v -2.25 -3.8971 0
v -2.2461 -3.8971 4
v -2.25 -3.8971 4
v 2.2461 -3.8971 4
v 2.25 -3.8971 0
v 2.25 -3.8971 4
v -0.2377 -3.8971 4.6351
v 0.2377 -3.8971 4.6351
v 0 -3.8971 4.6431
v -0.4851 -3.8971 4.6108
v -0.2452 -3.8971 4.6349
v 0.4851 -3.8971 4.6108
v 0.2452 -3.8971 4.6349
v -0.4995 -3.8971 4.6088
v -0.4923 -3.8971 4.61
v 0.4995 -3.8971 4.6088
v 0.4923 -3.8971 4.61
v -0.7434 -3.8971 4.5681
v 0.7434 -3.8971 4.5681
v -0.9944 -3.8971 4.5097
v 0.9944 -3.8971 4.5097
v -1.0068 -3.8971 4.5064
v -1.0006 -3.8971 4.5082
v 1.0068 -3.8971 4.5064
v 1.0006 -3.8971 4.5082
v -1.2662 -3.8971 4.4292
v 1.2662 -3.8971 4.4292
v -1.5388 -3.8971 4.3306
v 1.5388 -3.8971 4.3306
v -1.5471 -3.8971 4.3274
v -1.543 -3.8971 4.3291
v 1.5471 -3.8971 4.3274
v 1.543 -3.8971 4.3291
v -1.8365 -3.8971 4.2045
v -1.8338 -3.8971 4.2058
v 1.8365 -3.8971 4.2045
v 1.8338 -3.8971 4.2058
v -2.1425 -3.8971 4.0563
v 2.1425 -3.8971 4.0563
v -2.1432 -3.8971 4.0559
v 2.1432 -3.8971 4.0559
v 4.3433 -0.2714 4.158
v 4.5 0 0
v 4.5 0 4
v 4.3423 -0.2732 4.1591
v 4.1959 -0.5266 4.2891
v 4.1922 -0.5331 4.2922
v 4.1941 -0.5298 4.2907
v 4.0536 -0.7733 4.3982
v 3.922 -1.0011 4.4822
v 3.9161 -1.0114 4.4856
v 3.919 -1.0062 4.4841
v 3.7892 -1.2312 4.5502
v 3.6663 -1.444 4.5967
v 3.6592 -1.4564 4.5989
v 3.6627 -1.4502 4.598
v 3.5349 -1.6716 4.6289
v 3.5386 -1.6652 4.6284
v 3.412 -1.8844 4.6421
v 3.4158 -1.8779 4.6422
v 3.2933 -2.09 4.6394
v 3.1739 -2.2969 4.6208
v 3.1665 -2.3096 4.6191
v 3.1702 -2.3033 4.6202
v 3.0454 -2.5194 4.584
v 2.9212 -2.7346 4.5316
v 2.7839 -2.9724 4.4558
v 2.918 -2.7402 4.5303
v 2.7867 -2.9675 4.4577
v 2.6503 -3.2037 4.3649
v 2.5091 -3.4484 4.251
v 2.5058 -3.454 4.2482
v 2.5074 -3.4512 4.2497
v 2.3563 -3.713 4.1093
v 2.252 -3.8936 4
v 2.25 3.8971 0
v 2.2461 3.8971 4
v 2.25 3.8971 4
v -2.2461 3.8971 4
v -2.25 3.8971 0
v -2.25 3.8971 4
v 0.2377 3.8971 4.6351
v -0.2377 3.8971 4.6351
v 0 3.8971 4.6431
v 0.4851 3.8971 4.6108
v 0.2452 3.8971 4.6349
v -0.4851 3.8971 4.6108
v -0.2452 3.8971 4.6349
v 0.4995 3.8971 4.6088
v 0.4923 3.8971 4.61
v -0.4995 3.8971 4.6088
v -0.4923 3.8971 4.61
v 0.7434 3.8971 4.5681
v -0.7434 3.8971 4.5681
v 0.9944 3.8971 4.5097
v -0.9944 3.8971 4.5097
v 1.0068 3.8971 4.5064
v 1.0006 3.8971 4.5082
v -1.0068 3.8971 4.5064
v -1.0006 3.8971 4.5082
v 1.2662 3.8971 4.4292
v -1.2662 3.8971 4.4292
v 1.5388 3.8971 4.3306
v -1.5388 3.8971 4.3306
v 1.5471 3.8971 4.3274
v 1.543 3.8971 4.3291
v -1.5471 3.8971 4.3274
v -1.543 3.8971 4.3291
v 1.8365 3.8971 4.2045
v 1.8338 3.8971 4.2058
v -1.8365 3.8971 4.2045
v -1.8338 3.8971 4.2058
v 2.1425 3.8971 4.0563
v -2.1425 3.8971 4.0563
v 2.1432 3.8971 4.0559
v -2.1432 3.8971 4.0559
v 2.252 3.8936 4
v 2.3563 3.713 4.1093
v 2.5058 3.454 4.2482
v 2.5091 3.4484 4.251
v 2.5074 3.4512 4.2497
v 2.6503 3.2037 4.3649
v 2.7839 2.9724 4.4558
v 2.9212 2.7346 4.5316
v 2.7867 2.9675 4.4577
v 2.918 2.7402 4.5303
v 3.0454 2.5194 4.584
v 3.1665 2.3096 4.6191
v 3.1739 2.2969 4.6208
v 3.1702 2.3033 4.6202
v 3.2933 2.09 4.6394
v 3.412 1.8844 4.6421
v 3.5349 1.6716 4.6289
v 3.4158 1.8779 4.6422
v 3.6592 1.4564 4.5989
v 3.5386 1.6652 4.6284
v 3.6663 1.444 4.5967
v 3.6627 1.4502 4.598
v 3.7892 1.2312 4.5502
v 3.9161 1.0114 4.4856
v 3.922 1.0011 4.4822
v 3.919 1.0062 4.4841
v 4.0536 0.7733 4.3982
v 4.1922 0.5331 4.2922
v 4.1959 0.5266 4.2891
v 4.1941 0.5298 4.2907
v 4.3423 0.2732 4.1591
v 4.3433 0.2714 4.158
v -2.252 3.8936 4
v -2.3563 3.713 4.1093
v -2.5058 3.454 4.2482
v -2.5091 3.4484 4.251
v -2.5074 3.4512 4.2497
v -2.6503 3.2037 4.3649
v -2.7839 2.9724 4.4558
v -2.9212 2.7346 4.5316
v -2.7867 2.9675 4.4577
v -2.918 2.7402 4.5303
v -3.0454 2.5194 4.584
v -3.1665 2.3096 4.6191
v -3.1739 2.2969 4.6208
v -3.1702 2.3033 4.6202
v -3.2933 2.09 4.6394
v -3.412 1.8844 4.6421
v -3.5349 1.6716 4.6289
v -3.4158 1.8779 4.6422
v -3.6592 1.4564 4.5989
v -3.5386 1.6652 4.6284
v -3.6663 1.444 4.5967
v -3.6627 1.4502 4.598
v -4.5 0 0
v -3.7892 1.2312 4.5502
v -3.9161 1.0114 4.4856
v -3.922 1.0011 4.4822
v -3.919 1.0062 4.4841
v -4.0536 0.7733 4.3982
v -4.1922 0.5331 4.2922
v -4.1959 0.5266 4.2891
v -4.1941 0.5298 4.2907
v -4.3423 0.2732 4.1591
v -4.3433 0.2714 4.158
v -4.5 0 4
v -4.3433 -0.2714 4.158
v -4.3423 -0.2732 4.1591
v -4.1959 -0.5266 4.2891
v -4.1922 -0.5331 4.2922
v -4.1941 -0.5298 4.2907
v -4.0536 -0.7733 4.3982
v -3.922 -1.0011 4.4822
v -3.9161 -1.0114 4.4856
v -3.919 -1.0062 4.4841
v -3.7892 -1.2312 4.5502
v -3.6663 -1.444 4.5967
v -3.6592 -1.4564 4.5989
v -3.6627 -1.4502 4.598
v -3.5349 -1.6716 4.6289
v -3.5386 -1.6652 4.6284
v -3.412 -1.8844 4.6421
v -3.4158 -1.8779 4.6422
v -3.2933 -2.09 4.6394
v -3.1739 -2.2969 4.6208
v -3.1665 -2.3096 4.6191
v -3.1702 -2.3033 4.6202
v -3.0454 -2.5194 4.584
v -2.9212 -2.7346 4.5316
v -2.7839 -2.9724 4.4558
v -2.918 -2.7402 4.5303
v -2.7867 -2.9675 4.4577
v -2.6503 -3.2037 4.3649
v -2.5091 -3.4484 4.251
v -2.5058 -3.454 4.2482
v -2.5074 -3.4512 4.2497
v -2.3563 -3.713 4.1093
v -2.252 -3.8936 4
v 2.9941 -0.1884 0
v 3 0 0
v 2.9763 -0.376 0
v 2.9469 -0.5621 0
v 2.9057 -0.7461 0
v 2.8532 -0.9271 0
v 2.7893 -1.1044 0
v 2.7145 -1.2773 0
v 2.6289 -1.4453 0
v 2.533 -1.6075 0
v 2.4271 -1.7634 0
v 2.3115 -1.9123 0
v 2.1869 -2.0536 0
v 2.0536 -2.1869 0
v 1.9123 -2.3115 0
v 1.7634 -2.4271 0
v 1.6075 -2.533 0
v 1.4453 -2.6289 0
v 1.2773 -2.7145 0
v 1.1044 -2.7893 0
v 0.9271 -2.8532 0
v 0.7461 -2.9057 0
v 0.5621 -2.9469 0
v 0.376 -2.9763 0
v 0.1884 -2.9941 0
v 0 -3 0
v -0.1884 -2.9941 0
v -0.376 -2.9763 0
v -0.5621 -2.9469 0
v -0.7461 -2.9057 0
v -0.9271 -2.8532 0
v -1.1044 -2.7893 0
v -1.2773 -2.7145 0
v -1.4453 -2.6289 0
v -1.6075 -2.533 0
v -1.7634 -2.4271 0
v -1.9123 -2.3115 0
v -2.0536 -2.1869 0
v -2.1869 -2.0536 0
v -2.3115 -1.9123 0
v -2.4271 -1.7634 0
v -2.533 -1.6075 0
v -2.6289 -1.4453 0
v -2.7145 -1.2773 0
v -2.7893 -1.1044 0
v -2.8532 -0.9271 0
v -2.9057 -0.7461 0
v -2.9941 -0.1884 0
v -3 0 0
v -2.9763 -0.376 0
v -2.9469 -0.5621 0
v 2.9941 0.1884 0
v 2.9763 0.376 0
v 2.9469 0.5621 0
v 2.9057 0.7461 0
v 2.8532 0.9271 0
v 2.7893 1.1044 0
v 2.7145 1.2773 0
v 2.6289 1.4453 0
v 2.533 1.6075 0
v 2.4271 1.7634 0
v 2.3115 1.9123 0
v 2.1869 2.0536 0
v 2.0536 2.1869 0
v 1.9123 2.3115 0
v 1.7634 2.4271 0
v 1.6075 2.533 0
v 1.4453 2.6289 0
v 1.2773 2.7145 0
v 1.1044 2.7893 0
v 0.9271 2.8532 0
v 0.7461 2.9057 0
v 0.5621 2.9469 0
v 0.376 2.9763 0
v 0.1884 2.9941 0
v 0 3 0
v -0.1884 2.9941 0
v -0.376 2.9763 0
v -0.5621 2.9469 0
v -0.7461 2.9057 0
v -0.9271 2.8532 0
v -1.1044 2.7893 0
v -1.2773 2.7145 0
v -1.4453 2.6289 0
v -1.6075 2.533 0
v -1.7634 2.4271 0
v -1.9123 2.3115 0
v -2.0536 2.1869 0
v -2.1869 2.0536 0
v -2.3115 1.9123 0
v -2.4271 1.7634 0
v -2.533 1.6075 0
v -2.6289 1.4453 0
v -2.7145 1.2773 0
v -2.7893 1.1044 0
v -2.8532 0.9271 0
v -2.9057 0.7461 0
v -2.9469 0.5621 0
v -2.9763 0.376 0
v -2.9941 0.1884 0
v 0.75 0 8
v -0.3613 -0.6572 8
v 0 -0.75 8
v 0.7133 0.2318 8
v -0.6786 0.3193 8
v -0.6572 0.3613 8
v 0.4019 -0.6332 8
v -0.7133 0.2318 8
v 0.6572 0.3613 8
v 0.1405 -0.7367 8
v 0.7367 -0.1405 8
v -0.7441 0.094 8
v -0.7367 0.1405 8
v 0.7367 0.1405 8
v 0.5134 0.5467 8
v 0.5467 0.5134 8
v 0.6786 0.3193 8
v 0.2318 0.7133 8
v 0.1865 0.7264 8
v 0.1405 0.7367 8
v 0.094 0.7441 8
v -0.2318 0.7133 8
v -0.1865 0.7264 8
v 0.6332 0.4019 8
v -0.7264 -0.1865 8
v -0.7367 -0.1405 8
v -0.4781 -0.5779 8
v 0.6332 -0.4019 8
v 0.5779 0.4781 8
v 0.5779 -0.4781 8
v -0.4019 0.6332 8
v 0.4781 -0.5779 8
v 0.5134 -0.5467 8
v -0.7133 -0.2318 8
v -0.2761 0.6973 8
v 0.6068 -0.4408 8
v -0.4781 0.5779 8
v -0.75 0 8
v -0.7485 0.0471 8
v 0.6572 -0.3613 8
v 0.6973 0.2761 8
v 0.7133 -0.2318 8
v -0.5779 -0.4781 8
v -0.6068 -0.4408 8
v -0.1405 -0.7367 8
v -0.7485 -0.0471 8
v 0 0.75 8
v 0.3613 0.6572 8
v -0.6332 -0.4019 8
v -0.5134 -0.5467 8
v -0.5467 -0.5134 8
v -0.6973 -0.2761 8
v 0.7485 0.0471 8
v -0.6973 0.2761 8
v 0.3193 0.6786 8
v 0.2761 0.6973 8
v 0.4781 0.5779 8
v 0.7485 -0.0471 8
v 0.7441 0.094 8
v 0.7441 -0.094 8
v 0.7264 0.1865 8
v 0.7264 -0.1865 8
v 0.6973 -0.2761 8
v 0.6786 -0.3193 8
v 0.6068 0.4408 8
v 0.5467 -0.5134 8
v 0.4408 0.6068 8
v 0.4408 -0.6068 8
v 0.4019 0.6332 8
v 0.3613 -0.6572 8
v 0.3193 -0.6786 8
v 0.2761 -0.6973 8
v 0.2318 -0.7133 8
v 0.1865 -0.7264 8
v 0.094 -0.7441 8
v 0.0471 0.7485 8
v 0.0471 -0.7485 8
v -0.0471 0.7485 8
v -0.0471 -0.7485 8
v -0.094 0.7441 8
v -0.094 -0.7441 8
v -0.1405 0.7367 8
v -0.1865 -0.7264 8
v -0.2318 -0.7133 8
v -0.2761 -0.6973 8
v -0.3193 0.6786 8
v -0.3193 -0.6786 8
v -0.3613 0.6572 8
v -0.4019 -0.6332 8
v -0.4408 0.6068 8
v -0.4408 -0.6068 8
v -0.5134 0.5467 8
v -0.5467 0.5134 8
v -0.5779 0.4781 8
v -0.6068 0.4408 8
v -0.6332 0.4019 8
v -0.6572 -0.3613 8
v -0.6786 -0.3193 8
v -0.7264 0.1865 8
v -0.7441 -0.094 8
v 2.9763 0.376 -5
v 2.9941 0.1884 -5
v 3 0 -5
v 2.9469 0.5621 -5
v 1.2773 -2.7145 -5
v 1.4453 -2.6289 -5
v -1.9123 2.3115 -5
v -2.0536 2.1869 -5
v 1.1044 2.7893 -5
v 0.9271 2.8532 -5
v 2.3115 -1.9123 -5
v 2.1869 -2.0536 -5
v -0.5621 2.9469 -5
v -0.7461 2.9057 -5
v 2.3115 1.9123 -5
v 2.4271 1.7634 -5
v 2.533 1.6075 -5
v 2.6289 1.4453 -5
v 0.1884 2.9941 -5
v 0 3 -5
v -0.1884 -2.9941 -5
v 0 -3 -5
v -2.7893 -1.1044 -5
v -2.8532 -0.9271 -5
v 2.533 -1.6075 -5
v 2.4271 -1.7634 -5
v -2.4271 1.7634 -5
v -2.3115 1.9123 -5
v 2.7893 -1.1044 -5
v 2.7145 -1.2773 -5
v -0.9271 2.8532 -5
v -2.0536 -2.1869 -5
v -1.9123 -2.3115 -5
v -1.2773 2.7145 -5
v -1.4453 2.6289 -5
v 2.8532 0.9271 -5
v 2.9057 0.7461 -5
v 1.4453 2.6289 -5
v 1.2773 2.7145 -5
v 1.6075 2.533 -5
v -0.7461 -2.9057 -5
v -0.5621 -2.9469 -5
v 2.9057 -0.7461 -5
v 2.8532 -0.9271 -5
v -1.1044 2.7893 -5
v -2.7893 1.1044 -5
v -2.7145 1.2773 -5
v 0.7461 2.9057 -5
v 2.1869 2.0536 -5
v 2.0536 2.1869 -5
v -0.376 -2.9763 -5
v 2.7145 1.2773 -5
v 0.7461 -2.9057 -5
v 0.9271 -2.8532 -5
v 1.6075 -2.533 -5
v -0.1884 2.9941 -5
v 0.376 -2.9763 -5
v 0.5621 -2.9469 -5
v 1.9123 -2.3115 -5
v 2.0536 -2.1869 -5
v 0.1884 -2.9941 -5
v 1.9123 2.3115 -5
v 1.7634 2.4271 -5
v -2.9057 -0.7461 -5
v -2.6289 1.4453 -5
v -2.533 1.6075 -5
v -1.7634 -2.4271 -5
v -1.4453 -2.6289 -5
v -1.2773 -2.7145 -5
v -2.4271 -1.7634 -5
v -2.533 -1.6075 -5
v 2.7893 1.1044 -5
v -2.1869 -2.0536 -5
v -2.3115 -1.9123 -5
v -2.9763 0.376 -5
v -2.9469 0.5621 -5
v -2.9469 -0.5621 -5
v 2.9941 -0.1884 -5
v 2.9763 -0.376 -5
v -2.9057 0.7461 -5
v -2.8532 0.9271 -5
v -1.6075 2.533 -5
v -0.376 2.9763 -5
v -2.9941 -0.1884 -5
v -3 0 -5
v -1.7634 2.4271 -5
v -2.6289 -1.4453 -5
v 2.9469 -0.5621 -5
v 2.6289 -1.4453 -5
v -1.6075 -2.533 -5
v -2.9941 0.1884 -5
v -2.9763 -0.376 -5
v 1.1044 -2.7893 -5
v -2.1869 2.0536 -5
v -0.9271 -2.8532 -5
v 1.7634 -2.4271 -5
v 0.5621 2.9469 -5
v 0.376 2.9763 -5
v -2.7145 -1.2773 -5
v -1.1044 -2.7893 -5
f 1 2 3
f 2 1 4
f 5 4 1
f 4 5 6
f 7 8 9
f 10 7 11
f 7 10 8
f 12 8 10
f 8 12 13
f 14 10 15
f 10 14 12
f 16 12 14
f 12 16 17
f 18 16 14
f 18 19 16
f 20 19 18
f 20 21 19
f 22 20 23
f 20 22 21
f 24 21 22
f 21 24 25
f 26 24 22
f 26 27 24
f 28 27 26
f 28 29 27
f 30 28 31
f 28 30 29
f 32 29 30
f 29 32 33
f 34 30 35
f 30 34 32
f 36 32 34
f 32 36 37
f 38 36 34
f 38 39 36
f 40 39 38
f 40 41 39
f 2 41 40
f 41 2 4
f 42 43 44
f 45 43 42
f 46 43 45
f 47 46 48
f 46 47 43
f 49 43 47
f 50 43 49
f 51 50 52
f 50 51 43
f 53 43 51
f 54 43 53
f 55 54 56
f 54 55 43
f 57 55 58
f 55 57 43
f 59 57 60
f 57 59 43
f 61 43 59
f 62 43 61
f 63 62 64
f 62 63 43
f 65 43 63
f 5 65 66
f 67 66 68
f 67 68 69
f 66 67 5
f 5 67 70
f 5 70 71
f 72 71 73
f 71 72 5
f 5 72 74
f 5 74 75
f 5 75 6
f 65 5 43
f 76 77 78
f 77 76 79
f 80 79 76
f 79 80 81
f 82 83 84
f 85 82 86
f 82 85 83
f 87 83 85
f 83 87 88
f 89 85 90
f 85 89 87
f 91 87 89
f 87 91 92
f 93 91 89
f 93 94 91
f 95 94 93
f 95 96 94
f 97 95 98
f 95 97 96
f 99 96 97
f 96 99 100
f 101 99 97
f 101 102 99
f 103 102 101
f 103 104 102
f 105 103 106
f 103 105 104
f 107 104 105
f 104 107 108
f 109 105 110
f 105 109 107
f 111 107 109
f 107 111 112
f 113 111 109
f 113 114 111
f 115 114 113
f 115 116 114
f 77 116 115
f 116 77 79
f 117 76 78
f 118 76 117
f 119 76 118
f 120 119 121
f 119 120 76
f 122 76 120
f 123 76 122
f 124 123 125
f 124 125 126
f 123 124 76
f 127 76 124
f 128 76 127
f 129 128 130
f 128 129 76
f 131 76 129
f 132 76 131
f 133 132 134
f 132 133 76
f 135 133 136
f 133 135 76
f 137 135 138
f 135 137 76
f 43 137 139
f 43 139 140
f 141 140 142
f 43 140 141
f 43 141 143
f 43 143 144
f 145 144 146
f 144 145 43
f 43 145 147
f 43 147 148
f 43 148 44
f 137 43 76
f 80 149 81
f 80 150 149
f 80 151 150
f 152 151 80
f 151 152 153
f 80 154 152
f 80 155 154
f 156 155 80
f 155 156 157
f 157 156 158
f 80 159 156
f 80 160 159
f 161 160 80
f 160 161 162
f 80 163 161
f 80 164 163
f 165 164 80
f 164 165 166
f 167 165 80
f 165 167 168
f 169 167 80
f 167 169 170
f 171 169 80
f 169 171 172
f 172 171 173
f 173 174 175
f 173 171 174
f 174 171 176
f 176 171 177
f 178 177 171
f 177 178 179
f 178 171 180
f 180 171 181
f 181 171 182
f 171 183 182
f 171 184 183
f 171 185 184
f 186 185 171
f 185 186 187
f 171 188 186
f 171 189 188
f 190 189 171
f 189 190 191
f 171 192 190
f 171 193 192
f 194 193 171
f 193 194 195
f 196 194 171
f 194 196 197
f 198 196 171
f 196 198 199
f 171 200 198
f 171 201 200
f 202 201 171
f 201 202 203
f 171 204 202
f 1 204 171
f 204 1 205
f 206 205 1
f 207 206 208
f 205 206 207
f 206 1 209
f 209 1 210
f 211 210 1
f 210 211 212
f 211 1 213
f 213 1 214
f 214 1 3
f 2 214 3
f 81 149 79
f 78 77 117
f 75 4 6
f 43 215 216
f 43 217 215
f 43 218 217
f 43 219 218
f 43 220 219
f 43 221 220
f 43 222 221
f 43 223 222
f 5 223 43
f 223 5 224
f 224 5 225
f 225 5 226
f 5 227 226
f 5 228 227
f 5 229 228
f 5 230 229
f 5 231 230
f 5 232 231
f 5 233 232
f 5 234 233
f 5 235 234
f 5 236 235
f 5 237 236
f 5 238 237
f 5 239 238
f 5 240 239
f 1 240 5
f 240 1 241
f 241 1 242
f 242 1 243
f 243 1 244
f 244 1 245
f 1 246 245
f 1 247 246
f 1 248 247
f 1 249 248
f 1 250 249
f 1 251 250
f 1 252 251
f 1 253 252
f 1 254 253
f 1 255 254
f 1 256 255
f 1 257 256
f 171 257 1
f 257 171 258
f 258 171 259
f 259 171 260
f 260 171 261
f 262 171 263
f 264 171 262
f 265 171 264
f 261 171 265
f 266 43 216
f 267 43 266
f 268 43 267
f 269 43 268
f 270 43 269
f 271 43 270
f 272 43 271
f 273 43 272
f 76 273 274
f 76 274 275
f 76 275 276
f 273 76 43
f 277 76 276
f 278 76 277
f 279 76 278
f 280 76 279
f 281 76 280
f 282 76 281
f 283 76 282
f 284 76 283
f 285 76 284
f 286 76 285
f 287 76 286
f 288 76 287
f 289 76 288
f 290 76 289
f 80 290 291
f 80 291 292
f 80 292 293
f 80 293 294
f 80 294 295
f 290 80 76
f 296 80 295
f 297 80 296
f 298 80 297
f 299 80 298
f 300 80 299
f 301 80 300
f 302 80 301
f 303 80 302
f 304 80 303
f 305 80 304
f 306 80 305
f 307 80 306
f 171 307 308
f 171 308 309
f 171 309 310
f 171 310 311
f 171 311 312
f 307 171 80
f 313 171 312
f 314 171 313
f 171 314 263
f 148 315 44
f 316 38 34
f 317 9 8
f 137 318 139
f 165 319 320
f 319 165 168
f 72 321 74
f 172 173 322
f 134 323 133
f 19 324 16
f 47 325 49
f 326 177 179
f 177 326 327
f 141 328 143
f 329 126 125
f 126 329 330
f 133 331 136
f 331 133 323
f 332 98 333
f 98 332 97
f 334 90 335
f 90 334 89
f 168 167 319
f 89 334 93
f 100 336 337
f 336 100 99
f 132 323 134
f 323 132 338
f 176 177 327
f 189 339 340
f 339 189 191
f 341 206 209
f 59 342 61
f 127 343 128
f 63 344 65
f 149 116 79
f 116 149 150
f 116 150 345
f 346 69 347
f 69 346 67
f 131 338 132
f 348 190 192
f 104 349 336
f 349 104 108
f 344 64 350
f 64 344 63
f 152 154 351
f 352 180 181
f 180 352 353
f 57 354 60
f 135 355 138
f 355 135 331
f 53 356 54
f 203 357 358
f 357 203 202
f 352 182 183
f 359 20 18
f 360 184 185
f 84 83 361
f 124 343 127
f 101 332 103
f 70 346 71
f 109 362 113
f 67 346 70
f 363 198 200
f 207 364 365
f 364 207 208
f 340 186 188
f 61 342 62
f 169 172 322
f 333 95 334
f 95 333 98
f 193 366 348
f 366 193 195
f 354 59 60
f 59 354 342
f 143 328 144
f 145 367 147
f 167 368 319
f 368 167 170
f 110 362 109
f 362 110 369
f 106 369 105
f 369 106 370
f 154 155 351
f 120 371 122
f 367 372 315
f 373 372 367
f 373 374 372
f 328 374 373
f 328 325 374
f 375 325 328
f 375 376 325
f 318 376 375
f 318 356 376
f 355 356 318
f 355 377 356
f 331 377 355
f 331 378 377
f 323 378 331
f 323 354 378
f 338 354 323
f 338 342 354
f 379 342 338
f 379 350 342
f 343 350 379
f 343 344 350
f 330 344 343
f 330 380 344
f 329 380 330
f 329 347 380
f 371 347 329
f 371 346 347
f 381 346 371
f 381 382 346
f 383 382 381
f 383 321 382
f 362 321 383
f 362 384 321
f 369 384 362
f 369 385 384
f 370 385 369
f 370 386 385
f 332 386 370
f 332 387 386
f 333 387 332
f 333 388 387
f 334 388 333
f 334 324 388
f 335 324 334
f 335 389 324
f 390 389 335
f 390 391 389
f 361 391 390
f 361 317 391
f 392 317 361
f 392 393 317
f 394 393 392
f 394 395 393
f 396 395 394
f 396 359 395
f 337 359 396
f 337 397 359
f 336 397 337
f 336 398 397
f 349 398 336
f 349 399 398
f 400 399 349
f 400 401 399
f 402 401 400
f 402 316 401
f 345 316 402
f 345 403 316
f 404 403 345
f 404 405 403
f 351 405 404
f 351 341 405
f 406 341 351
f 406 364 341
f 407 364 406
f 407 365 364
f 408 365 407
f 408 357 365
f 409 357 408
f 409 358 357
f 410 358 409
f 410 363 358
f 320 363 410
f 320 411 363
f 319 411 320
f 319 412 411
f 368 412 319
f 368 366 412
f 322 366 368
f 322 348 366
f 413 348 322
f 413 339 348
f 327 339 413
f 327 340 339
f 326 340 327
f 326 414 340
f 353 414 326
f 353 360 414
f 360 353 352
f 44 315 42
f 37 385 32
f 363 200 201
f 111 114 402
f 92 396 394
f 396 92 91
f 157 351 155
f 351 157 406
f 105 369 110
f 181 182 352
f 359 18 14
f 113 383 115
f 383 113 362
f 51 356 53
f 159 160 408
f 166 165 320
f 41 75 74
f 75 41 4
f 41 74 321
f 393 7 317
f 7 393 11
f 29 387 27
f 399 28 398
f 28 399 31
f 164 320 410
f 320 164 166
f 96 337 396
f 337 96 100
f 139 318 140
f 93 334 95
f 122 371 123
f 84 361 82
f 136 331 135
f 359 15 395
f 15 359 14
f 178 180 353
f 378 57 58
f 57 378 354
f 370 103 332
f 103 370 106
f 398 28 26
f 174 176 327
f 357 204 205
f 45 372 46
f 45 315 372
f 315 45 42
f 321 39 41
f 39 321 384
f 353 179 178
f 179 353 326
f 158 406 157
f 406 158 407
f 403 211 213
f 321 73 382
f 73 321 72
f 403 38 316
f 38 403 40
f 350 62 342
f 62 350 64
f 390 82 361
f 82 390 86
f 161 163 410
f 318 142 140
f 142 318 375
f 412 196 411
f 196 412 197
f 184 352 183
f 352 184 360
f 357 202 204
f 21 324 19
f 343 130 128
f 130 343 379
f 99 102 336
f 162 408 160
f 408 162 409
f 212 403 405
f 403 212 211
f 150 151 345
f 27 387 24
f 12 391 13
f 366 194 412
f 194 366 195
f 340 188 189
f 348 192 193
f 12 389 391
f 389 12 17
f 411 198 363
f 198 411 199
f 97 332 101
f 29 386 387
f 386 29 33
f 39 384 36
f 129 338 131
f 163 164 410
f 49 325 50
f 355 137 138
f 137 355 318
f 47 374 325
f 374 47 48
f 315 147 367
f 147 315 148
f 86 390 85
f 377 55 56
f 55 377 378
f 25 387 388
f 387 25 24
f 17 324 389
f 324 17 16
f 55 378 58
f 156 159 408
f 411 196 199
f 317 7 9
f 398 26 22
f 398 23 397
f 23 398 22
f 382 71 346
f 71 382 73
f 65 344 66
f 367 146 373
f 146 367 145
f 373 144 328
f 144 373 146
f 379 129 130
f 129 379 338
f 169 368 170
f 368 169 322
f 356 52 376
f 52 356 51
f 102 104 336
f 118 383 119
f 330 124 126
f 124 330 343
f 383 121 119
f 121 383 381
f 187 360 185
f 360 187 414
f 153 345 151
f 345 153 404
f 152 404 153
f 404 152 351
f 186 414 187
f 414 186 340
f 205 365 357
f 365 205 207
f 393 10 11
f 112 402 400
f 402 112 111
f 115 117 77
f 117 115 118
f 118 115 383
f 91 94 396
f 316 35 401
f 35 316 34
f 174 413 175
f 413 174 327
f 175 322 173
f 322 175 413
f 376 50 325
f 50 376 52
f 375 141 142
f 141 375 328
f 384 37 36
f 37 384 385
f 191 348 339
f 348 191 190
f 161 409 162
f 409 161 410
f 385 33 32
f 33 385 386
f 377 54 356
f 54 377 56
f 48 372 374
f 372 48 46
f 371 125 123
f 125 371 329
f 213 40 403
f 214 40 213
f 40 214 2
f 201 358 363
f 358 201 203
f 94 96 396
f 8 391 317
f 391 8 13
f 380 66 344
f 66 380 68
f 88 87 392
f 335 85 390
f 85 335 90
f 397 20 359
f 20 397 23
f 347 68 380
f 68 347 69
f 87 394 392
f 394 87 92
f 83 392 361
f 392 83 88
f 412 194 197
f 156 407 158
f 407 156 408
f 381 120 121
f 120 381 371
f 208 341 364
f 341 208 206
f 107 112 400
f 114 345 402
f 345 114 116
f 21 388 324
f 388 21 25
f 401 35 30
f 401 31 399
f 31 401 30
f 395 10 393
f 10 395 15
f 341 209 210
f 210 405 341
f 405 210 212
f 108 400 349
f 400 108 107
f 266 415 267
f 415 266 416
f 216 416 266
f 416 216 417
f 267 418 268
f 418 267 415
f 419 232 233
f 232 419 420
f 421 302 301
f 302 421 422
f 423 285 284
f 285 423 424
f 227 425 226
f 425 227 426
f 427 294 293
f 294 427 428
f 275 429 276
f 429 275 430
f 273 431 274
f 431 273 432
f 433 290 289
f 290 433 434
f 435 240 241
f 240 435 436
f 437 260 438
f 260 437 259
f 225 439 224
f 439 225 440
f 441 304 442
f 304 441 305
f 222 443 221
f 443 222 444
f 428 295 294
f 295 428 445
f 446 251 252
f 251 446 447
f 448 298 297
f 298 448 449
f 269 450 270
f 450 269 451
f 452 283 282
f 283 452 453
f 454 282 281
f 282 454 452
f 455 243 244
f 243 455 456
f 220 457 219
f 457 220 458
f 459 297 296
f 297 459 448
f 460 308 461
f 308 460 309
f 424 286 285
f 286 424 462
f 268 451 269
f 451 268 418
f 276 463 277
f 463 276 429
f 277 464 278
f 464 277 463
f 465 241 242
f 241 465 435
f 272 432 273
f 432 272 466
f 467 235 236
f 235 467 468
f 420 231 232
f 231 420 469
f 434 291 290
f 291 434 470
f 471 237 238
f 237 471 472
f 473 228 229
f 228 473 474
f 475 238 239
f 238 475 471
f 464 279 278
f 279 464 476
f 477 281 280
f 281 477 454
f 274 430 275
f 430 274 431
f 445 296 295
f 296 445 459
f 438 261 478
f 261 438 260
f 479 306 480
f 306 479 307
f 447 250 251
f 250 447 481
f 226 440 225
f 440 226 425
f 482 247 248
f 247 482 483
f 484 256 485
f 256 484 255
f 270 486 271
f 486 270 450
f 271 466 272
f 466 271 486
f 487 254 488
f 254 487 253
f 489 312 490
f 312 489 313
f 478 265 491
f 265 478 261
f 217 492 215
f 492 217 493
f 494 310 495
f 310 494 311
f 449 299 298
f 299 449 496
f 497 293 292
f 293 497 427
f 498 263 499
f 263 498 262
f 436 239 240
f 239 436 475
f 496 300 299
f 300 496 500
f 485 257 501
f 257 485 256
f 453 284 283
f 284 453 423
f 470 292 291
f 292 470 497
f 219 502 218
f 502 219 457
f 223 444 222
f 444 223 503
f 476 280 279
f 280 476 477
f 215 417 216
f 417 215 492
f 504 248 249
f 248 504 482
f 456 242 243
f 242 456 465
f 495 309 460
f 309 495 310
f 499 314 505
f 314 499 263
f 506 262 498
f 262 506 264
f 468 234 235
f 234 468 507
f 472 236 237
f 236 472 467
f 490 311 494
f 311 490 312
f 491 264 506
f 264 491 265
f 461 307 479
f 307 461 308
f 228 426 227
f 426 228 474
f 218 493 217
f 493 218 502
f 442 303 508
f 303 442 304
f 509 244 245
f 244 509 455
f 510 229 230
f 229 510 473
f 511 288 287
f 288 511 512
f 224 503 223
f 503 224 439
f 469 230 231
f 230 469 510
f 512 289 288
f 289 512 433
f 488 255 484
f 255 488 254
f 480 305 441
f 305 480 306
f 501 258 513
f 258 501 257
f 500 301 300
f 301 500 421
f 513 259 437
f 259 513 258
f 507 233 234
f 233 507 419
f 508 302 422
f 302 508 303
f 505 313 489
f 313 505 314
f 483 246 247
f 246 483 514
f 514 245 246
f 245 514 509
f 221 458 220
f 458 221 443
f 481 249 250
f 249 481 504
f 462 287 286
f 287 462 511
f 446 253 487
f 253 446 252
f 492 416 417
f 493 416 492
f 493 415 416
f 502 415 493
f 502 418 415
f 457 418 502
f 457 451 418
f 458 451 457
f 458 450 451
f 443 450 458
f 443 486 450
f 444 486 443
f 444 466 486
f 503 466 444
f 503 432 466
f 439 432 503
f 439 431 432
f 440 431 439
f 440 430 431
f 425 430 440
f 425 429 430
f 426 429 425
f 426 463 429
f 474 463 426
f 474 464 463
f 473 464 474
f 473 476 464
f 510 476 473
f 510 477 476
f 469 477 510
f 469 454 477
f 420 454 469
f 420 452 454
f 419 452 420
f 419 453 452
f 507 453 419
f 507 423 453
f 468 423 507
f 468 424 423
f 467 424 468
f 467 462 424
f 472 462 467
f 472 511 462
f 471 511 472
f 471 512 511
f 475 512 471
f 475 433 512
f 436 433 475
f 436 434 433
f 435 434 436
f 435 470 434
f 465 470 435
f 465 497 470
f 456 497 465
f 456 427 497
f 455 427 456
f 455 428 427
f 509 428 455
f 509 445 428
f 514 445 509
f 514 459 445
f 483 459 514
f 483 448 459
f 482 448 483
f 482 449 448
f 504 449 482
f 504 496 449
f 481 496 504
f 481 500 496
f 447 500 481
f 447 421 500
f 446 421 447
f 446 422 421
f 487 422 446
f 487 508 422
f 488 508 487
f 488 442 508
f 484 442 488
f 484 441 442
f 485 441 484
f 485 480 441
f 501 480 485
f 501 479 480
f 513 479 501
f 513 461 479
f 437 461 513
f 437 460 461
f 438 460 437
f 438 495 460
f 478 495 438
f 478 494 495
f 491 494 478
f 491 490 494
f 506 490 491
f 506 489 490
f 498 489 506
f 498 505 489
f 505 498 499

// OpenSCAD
difference(){
    union(){
        cylinder(h = 4, d = 9, $fn = 6); 
        translate([0,0,4])
        cylinder(h = 4, d1 = 9, d2 = 1.5, $fn =  100);
    }
    translate([0,0,3])
    union(){
        difference(){
            cylinder(h = 5, d = 10, $fn = 100); 
            cylinder(h = 5, d = 9, $fn = 6);   
        }
    }
}
translate([0,0,-5])
cylinder(h = 5, d = 6, $fn = 100);
    
